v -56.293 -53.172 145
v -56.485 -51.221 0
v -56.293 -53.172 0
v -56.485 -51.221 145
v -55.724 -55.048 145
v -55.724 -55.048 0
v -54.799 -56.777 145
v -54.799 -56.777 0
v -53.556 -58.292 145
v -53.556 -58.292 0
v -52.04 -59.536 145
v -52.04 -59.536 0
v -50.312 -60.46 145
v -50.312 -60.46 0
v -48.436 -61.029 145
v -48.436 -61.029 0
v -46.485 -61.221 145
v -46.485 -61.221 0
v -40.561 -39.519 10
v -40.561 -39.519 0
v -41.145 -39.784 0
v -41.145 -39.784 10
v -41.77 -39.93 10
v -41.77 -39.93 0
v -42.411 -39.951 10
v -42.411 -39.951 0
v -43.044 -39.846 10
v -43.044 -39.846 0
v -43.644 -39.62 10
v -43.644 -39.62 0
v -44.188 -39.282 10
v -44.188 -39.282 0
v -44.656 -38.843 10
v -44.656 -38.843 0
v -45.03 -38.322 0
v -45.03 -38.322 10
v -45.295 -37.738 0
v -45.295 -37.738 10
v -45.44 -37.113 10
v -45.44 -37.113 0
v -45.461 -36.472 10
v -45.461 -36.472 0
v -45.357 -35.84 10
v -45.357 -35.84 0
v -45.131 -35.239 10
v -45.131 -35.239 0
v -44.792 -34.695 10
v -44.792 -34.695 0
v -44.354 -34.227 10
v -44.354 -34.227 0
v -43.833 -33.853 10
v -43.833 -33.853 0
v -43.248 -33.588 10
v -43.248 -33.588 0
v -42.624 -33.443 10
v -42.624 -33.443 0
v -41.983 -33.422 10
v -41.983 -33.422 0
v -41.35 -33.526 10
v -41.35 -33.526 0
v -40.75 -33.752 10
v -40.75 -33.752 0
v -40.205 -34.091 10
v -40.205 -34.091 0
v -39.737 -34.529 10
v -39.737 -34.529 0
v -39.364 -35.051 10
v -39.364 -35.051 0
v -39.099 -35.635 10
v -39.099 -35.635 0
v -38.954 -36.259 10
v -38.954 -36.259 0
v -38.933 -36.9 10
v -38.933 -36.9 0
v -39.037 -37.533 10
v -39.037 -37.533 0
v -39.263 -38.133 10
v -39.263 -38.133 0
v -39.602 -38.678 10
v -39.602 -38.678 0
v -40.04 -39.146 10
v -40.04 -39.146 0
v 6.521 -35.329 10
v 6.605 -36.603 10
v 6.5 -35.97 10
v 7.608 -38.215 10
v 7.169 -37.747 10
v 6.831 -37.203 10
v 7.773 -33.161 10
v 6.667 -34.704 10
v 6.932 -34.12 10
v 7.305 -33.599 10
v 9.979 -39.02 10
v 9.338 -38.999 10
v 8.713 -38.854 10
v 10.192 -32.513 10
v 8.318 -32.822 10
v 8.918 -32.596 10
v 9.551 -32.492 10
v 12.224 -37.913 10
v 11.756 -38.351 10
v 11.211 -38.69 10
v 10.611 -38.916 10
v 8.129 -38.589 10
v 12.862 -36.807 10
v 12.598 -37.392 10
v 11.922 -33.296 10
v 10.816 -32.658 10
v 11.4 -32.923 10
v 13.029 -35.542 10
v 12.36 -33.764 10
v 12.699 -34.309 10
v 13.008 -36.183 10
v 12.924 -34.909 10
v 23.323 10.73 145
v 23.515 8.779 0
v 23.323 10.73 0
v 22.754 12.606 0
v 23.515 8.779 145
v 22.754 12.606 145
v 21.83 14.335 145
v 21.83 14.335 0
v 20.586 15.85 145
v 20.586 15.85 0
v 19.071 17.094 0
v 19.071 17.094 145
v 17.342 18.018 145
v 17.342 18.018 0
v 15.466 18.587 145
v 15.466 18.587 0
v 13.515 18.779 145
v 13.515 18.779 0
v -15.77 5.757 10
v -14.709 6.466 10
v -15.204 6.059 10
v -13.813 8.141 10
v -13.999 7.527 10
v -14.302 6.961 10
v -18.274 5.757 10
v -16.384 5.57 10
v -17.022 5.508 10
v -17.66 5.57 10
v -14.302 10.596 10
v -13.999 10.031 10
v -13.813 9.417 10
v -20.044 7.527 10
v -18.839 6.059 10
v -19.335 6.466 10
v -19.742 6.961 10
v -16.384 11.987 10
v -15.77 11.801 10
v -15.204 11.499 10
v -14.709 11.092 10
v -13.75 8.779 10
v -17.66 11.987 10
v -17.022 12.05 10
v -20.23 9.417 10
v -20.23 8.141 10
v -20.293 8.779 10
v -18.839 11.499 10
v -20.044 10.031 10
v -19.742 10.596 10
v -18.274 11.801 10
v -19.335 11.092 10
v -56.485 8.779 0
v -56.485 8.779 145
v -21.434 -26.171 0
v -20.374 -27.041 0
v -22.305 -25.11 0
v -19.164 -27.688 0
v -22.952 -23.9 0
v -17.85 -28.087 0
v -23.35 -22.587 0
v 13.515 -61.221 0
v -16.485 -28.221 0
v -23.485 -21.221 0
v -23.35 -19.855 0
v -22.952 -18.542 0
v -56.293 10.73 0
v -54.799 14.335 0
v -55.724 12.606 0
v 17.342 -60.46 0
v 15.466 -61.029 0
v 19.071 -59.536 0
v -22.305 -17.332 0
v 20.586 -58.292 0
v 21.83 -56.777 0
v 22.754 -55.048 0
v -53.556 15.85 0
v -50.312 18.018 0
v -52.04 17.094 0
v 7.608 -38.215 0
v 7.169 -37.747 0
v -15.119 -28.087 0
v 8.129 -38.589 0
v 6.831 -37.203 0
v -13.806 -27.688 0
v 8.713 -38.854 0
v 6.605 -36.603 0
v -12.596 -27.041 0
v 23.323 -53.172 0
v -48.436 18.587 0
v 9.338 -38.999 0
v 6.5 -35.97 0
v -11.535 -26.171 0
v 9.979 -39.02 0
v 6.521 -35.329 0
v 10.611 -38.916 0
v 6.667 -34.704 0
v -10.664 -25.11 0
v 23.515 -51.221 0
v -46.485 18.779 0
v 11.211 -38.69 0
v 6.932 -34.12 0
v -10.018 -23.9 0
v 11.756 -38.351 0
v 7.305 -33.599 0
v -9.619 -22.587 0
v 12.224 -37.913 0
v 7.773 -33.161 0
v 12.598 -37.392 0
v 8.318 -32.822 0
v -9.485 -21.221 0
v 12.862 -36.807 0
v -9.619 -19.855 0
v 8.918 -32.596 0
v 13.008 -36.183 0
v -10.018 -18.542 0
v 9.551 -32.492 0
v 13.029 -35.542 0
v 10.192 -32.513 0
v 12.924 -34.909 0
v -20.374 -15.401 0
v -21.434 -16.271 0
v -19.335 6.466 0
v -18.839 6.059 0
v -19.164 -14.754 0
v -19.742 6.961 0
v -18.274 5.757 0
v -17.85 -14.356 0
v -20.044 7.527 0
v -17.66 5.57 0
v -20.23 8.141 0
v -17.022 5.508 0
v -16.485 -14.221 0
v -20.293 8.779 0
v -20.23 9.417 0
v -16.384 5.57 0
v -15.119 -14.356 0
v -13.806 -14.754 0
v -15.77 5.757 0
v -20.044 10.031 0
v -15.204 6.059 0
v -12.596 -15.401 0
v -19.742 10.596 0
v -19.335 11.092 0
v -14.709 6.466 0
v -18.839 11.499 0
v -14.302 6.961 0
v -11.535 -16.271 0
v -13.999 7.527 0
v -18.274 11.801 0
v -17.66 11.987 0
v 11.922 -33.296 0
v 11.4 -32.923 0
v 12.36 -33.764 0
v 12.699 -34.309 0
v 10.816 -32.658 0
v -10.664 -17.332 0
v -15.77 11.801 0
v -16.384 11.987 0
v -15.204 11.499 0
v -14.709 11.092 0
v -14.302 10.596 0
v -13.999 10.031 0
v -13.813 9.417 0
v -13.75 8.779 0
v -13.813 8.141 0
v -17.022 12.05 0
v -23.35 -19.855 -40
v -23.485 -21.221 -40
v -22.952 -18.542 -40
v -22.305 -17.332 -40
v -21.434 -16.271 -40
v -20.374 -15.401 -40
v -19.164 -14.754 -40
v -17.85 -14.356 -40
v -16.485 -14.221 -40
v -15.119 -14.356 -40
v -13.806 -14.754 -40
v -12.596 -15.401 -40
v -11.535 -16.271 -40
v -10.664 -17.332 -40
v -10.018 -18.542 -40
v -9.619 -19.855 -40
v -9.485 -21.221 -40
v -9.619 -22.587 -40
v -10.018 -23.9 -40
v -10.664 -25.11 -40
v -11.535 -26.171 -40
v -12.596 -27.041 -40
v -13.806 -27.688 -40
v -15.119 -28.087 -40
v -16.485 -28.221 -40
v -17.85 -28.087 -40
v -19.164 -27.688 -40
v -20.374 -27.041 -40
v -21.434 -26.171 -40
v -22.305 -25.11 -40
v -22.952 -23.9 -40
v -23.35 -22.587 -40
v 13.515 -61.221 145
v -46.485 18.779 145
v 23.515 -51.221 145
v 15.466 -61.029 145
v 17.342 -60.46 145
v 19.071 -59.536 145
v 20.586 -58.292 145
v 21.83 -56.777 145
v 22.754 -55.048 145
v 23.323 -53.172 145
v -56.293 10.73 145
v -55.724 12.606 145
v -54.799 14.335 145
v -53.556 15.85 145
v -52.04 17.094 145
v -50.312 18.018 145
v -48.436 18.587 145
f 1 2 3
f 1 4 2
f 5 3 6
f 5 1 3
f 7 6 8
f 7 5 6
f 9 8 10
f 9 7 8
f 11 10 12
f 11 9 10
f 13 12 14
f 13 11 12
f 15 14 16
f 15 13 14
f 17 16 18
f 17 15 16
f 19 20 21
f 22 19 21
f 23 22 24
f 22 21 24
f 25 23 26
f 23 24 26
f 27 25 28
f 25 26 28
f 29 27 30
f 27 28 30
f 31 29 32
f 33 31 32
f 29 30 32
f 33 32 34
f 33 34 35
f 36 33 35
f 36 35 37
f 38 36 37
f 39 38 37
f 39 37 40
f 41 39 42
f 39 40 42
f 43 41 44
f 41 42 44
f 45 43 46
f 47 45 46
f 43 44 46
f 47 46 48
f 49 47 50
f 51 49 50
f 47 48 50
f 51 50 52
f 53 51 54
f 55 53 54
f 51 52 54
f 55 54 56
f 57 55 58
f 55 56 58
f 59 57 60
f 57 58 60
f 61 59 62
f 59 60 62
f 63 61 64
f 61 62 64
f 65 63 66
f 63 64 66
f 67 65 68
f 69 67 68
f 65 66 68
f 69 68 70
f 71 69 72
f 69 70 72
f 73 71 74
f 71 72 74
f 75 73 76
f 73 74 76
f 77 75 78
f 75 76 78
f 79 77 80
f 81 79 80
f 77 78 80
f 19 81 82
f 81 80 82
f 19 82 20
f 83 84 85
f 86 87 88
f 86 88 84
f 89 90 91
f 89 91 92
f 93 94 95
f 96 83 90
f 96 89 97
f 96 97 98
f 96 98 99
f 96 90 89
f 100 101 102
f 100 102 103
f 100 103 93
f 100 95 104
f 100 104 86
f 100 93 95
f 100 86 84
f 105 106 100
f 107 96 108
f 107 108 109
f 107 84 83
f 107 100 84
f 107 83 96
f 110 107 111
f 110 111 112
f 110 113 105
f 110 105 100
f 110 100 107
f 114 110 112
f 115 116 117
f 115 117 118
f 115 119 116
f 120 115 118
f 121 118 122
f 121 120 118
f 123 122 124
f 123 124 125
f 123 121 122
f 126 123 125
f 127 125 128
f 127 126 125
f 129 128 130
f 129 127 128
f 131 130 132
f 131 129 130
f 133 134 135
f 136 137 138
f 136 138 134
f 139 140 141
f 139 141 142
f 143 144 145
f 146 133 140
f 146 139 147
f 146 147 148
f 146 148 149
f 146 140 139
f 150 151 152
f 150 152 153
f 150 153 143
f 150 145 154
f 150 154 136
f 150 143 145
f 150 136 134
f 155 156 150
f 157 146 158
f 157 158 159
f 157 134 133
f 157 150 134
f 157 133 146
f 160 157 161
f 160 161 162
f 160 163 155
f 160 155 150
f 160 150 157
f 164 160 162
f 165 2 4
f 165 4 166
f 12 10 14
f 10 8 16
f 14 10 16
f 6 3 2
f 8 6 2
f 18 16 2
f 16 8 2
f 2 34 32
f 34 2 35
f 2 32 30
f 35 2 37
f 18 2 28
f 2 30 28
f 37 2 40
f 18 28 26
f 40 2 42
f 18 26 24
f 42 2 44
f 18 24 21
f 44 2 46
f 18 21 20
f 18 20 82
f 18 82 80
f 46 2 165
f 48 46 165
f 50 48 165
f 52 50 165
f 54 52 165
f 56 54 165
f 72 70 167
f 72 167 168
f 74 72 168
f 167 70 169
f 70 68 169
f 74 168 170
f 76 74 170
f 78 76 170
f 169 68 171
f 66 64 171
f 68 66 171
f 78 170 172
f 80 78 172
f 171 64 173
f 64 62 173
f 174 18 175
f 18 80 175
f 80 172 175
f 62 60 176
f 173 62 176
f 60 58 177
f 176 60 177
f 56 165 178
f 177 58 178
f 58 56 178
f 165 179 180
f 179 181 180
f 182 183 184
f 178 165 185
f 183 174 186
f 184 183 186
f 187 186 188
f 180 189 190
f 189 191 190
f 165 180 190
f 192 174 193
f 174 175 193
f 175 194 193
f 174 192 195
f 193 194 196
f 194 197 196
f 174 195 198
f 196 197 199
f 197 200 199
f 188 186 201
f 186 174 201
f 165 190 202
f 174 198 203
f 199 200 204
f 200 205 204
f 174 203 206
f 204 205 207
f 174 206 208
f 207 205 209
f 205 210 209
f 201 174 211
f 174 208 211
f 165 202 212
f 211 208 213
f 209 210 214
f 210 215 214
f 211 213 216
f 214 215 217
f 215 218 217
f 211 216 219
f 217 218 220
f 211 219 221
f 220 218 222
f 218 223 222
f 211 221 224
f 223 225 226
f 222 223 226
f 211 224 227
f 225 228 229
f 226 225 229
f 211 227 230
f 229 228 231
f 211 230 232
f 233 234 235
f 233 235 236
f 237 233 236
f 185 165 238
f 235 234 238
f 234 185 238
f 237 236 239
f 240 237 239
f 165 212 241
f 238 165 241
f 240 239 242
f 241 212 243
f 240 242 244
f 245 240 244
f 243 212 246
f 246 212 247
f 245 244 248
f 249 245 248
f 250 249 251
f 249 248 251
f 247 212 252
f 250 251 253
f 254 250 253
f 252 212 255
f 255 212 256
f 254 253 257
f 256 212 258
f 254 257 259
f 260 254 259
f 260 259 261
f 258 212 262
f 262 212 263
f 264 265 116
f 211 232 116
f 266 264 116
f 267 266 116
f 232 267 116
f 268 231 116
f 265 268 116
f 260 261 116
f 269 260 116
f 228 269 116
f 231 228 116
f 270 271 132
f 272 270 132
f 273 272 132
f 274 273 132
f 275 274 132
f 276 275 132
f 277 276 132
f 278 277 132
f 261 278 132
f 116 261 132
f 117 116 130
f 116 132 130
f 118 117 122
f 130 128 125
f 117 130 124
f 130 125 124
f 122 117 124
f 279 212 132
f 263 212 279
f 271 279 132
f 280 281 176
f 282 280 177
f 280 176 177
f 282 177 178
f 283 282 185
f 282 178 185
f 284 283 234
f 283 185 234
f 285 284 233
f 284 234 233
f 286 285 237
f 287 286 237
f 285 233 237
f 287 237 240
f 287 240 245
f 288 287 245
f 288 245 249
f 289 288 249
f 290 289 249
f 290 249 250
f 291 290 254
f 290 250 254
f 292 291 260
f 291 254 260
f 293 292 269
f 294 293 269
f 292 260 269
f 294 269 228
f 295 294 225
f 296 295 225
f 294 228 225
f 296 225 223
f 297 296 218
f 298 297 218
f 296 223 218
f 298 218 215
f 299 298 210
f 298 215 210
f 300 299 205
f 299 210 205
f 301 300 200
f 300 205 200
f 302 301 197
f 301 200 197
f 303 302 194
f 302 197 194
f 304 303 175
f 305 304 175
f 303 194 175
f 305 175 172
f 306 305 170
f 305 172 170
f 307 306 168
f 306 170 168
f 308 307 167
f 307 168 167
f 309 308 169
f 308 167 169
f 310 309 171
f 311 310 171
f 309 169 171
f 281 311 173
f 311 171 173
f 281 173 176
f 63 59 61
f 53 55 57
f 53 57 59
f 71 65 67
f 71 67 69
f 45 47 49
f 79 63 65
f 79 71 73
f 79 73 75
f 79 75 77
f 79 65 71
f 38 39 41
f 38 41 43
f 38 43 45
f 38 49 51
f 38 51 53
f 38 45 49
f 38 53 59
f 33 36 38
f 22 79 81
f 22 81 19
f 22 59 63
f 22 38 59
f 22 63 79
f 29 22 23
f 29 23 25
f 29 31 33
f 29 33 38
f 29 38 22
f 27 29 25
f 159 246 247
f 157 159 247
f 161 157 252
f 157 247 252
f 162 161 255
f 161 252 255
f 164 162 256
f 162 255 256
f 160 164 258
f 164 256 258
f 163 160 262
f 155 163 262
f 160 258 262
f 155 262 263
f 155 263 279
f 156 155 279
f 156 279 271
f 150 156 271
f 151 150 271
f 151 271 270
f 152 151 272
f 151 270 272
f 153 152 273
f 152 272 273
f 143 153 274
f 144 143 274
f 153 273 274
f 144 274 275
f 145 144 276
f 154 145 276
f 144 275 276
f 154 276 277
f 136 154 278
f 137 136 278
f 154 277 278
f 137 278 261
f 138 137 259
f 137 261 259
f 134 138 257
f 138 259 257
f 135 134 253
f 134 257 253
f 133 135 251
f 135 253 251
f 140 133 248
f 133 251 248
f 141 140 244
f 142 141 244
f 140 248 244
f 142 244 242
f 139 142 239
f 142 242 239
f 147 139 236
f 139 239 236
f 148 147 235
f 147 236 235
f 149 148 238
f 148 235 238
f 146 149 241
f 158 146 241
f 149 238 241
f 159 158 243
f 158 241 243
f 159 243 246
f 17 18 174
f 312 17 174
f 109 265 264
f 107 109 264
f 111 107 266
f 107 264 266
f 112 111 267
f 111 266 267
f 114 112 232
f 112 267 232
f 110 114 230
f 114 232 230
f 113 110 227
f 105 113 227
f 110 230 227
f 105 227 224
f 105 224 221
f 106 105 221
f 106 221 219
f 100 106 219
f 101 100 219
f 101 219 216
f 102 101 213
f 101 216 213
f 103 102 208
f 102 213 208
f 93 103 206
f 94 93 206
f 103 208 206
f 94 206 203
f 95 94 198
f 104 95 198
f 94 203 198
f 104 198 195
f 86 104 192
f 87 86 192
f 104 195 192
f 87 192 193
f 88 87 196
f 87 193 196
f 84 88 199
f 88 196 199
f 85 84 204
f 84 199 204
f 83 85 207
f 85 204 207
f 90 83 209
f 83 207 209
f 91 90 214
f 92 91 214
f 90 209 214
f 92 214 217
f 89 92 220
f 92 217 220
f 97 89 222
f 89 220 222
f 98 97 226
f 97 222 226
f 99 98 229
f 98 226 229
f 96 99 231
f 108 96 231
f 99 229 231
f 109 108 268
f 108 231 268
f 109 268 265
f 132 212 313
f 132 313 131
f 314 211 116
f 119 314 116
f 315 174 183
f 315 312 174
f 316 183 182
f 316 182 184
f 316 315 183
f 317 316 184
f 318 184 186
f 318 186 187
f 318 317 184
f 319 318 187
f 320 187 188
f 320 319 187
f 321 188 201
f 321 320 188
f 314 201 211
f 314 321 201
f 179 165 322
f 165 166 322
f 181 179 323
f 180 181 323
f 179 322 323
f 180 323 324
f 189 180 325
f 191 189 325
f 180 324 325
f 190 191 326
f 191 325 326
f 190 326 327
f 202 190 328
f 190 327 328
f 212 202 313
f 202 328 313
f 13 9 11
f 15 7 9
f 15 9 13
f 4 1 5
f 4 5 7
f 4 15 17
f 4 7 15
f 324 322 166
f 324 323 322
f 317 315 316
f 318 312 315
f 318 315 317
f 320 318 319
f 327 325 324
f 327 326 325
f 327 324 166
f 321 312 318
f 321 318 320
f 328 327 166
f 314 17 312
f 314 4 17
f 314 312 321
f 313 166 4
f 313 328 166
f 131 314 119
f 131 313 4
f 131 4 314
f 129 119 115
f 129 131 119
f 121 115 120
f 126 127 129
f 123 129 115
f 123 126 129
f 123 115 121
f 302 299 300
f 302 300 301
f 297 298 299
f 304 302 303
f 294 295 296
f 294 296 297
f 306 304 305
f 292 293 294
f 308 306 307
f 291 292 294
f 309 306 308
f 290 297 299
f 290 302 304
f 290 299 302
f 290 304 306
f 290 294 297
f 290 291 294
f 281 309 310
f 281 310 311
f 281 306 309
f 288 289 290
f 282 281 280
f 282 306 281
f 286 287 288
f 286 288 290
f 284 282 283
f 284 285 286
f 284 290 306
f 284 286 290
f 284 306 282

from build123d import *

# Parameters (mm, degrees)
SKETCH_1_W               = 80
SKETCH_1_H               = 80
EXTRUDE_1_DEPTH          = 145
FILLET_1_R               = 10
SKETCH_2_R               = 7
EXTRUDE_2_DEPTH          = 40
SKETCH_3_R               = 3.271360977
CUT_EXTRUDE_1_DEPTH      = 10
PATTERN_CIRCULAR_1_COUNT = 3


with BuildPart() as part:
    # Эскиз1 → Бобышка-Вытянуть1 (new body)
    with BuildSketch(Plane.XY):
        with Locations((-16.484717947, -21.221052632)):
            Rectangle(SKETCH_1_W, SKETCH_1_H)
    extrude(amount=EXTRUDE_1_DEPTH)

    # Скругление1
    fillet_1_edges = [part.edges().sort_by_distance(p)[0] for p in [
        (-56.484717947, 18.778947368, 72.5),
        (23.515282053, 18.778947368, 72.5),
        (23.515282053, -61.221052632, 72.5),
        (-56.484717947, -61.221052632, 72.5),
    ]]
    fillet(fillet_1_edges, radius=FILLET_1_R)

    # Эскиз2 → Бобышка-Вытянуть2 (add)
    with BuildSketch(Plane(origin=(0, 0, 0), x_dir=(-1, 0, 0), z_dir=(0, 0, -1))):
        with Locations((16.484717947, -21.221052632)):
            Circle(SKETCH_2_R)
    extrude(amount=EXTRUDE_2_DEPTH)

    # Эскиз3 → Вырез-Вытянуть1 (cut)
    with BuildSketch(Plane(origin=(0, 0, 0), x_dir=(-1, 0, 0), z_dir=(0, 0, -1))):
        with Locations((17.021835437, 8.778947368)):
            Circle(SKETCH_3_R)
    cut_extrude_1 = extrude(amount=-CUT_EXTRUDE_1_DEPTH, mode=Mode.SUBTRACT)

    # Круговой массив1: Вырез-Вытянуть1 ×3 about axis
    pattern_circular_1_axis = Axis((-16.484717947, -21.221052632, 0), (0, 0, 1))
    for i in range(1, PATTERN_CIRCULAR_1_COUNT):
        add(cut_extrude_1.rotate(pattern_circular_1_axis, i * 360 / PATTERN_CIRCULAR_1_COUNT), mode=Mode.SUBTRACT)


solid = part.part
